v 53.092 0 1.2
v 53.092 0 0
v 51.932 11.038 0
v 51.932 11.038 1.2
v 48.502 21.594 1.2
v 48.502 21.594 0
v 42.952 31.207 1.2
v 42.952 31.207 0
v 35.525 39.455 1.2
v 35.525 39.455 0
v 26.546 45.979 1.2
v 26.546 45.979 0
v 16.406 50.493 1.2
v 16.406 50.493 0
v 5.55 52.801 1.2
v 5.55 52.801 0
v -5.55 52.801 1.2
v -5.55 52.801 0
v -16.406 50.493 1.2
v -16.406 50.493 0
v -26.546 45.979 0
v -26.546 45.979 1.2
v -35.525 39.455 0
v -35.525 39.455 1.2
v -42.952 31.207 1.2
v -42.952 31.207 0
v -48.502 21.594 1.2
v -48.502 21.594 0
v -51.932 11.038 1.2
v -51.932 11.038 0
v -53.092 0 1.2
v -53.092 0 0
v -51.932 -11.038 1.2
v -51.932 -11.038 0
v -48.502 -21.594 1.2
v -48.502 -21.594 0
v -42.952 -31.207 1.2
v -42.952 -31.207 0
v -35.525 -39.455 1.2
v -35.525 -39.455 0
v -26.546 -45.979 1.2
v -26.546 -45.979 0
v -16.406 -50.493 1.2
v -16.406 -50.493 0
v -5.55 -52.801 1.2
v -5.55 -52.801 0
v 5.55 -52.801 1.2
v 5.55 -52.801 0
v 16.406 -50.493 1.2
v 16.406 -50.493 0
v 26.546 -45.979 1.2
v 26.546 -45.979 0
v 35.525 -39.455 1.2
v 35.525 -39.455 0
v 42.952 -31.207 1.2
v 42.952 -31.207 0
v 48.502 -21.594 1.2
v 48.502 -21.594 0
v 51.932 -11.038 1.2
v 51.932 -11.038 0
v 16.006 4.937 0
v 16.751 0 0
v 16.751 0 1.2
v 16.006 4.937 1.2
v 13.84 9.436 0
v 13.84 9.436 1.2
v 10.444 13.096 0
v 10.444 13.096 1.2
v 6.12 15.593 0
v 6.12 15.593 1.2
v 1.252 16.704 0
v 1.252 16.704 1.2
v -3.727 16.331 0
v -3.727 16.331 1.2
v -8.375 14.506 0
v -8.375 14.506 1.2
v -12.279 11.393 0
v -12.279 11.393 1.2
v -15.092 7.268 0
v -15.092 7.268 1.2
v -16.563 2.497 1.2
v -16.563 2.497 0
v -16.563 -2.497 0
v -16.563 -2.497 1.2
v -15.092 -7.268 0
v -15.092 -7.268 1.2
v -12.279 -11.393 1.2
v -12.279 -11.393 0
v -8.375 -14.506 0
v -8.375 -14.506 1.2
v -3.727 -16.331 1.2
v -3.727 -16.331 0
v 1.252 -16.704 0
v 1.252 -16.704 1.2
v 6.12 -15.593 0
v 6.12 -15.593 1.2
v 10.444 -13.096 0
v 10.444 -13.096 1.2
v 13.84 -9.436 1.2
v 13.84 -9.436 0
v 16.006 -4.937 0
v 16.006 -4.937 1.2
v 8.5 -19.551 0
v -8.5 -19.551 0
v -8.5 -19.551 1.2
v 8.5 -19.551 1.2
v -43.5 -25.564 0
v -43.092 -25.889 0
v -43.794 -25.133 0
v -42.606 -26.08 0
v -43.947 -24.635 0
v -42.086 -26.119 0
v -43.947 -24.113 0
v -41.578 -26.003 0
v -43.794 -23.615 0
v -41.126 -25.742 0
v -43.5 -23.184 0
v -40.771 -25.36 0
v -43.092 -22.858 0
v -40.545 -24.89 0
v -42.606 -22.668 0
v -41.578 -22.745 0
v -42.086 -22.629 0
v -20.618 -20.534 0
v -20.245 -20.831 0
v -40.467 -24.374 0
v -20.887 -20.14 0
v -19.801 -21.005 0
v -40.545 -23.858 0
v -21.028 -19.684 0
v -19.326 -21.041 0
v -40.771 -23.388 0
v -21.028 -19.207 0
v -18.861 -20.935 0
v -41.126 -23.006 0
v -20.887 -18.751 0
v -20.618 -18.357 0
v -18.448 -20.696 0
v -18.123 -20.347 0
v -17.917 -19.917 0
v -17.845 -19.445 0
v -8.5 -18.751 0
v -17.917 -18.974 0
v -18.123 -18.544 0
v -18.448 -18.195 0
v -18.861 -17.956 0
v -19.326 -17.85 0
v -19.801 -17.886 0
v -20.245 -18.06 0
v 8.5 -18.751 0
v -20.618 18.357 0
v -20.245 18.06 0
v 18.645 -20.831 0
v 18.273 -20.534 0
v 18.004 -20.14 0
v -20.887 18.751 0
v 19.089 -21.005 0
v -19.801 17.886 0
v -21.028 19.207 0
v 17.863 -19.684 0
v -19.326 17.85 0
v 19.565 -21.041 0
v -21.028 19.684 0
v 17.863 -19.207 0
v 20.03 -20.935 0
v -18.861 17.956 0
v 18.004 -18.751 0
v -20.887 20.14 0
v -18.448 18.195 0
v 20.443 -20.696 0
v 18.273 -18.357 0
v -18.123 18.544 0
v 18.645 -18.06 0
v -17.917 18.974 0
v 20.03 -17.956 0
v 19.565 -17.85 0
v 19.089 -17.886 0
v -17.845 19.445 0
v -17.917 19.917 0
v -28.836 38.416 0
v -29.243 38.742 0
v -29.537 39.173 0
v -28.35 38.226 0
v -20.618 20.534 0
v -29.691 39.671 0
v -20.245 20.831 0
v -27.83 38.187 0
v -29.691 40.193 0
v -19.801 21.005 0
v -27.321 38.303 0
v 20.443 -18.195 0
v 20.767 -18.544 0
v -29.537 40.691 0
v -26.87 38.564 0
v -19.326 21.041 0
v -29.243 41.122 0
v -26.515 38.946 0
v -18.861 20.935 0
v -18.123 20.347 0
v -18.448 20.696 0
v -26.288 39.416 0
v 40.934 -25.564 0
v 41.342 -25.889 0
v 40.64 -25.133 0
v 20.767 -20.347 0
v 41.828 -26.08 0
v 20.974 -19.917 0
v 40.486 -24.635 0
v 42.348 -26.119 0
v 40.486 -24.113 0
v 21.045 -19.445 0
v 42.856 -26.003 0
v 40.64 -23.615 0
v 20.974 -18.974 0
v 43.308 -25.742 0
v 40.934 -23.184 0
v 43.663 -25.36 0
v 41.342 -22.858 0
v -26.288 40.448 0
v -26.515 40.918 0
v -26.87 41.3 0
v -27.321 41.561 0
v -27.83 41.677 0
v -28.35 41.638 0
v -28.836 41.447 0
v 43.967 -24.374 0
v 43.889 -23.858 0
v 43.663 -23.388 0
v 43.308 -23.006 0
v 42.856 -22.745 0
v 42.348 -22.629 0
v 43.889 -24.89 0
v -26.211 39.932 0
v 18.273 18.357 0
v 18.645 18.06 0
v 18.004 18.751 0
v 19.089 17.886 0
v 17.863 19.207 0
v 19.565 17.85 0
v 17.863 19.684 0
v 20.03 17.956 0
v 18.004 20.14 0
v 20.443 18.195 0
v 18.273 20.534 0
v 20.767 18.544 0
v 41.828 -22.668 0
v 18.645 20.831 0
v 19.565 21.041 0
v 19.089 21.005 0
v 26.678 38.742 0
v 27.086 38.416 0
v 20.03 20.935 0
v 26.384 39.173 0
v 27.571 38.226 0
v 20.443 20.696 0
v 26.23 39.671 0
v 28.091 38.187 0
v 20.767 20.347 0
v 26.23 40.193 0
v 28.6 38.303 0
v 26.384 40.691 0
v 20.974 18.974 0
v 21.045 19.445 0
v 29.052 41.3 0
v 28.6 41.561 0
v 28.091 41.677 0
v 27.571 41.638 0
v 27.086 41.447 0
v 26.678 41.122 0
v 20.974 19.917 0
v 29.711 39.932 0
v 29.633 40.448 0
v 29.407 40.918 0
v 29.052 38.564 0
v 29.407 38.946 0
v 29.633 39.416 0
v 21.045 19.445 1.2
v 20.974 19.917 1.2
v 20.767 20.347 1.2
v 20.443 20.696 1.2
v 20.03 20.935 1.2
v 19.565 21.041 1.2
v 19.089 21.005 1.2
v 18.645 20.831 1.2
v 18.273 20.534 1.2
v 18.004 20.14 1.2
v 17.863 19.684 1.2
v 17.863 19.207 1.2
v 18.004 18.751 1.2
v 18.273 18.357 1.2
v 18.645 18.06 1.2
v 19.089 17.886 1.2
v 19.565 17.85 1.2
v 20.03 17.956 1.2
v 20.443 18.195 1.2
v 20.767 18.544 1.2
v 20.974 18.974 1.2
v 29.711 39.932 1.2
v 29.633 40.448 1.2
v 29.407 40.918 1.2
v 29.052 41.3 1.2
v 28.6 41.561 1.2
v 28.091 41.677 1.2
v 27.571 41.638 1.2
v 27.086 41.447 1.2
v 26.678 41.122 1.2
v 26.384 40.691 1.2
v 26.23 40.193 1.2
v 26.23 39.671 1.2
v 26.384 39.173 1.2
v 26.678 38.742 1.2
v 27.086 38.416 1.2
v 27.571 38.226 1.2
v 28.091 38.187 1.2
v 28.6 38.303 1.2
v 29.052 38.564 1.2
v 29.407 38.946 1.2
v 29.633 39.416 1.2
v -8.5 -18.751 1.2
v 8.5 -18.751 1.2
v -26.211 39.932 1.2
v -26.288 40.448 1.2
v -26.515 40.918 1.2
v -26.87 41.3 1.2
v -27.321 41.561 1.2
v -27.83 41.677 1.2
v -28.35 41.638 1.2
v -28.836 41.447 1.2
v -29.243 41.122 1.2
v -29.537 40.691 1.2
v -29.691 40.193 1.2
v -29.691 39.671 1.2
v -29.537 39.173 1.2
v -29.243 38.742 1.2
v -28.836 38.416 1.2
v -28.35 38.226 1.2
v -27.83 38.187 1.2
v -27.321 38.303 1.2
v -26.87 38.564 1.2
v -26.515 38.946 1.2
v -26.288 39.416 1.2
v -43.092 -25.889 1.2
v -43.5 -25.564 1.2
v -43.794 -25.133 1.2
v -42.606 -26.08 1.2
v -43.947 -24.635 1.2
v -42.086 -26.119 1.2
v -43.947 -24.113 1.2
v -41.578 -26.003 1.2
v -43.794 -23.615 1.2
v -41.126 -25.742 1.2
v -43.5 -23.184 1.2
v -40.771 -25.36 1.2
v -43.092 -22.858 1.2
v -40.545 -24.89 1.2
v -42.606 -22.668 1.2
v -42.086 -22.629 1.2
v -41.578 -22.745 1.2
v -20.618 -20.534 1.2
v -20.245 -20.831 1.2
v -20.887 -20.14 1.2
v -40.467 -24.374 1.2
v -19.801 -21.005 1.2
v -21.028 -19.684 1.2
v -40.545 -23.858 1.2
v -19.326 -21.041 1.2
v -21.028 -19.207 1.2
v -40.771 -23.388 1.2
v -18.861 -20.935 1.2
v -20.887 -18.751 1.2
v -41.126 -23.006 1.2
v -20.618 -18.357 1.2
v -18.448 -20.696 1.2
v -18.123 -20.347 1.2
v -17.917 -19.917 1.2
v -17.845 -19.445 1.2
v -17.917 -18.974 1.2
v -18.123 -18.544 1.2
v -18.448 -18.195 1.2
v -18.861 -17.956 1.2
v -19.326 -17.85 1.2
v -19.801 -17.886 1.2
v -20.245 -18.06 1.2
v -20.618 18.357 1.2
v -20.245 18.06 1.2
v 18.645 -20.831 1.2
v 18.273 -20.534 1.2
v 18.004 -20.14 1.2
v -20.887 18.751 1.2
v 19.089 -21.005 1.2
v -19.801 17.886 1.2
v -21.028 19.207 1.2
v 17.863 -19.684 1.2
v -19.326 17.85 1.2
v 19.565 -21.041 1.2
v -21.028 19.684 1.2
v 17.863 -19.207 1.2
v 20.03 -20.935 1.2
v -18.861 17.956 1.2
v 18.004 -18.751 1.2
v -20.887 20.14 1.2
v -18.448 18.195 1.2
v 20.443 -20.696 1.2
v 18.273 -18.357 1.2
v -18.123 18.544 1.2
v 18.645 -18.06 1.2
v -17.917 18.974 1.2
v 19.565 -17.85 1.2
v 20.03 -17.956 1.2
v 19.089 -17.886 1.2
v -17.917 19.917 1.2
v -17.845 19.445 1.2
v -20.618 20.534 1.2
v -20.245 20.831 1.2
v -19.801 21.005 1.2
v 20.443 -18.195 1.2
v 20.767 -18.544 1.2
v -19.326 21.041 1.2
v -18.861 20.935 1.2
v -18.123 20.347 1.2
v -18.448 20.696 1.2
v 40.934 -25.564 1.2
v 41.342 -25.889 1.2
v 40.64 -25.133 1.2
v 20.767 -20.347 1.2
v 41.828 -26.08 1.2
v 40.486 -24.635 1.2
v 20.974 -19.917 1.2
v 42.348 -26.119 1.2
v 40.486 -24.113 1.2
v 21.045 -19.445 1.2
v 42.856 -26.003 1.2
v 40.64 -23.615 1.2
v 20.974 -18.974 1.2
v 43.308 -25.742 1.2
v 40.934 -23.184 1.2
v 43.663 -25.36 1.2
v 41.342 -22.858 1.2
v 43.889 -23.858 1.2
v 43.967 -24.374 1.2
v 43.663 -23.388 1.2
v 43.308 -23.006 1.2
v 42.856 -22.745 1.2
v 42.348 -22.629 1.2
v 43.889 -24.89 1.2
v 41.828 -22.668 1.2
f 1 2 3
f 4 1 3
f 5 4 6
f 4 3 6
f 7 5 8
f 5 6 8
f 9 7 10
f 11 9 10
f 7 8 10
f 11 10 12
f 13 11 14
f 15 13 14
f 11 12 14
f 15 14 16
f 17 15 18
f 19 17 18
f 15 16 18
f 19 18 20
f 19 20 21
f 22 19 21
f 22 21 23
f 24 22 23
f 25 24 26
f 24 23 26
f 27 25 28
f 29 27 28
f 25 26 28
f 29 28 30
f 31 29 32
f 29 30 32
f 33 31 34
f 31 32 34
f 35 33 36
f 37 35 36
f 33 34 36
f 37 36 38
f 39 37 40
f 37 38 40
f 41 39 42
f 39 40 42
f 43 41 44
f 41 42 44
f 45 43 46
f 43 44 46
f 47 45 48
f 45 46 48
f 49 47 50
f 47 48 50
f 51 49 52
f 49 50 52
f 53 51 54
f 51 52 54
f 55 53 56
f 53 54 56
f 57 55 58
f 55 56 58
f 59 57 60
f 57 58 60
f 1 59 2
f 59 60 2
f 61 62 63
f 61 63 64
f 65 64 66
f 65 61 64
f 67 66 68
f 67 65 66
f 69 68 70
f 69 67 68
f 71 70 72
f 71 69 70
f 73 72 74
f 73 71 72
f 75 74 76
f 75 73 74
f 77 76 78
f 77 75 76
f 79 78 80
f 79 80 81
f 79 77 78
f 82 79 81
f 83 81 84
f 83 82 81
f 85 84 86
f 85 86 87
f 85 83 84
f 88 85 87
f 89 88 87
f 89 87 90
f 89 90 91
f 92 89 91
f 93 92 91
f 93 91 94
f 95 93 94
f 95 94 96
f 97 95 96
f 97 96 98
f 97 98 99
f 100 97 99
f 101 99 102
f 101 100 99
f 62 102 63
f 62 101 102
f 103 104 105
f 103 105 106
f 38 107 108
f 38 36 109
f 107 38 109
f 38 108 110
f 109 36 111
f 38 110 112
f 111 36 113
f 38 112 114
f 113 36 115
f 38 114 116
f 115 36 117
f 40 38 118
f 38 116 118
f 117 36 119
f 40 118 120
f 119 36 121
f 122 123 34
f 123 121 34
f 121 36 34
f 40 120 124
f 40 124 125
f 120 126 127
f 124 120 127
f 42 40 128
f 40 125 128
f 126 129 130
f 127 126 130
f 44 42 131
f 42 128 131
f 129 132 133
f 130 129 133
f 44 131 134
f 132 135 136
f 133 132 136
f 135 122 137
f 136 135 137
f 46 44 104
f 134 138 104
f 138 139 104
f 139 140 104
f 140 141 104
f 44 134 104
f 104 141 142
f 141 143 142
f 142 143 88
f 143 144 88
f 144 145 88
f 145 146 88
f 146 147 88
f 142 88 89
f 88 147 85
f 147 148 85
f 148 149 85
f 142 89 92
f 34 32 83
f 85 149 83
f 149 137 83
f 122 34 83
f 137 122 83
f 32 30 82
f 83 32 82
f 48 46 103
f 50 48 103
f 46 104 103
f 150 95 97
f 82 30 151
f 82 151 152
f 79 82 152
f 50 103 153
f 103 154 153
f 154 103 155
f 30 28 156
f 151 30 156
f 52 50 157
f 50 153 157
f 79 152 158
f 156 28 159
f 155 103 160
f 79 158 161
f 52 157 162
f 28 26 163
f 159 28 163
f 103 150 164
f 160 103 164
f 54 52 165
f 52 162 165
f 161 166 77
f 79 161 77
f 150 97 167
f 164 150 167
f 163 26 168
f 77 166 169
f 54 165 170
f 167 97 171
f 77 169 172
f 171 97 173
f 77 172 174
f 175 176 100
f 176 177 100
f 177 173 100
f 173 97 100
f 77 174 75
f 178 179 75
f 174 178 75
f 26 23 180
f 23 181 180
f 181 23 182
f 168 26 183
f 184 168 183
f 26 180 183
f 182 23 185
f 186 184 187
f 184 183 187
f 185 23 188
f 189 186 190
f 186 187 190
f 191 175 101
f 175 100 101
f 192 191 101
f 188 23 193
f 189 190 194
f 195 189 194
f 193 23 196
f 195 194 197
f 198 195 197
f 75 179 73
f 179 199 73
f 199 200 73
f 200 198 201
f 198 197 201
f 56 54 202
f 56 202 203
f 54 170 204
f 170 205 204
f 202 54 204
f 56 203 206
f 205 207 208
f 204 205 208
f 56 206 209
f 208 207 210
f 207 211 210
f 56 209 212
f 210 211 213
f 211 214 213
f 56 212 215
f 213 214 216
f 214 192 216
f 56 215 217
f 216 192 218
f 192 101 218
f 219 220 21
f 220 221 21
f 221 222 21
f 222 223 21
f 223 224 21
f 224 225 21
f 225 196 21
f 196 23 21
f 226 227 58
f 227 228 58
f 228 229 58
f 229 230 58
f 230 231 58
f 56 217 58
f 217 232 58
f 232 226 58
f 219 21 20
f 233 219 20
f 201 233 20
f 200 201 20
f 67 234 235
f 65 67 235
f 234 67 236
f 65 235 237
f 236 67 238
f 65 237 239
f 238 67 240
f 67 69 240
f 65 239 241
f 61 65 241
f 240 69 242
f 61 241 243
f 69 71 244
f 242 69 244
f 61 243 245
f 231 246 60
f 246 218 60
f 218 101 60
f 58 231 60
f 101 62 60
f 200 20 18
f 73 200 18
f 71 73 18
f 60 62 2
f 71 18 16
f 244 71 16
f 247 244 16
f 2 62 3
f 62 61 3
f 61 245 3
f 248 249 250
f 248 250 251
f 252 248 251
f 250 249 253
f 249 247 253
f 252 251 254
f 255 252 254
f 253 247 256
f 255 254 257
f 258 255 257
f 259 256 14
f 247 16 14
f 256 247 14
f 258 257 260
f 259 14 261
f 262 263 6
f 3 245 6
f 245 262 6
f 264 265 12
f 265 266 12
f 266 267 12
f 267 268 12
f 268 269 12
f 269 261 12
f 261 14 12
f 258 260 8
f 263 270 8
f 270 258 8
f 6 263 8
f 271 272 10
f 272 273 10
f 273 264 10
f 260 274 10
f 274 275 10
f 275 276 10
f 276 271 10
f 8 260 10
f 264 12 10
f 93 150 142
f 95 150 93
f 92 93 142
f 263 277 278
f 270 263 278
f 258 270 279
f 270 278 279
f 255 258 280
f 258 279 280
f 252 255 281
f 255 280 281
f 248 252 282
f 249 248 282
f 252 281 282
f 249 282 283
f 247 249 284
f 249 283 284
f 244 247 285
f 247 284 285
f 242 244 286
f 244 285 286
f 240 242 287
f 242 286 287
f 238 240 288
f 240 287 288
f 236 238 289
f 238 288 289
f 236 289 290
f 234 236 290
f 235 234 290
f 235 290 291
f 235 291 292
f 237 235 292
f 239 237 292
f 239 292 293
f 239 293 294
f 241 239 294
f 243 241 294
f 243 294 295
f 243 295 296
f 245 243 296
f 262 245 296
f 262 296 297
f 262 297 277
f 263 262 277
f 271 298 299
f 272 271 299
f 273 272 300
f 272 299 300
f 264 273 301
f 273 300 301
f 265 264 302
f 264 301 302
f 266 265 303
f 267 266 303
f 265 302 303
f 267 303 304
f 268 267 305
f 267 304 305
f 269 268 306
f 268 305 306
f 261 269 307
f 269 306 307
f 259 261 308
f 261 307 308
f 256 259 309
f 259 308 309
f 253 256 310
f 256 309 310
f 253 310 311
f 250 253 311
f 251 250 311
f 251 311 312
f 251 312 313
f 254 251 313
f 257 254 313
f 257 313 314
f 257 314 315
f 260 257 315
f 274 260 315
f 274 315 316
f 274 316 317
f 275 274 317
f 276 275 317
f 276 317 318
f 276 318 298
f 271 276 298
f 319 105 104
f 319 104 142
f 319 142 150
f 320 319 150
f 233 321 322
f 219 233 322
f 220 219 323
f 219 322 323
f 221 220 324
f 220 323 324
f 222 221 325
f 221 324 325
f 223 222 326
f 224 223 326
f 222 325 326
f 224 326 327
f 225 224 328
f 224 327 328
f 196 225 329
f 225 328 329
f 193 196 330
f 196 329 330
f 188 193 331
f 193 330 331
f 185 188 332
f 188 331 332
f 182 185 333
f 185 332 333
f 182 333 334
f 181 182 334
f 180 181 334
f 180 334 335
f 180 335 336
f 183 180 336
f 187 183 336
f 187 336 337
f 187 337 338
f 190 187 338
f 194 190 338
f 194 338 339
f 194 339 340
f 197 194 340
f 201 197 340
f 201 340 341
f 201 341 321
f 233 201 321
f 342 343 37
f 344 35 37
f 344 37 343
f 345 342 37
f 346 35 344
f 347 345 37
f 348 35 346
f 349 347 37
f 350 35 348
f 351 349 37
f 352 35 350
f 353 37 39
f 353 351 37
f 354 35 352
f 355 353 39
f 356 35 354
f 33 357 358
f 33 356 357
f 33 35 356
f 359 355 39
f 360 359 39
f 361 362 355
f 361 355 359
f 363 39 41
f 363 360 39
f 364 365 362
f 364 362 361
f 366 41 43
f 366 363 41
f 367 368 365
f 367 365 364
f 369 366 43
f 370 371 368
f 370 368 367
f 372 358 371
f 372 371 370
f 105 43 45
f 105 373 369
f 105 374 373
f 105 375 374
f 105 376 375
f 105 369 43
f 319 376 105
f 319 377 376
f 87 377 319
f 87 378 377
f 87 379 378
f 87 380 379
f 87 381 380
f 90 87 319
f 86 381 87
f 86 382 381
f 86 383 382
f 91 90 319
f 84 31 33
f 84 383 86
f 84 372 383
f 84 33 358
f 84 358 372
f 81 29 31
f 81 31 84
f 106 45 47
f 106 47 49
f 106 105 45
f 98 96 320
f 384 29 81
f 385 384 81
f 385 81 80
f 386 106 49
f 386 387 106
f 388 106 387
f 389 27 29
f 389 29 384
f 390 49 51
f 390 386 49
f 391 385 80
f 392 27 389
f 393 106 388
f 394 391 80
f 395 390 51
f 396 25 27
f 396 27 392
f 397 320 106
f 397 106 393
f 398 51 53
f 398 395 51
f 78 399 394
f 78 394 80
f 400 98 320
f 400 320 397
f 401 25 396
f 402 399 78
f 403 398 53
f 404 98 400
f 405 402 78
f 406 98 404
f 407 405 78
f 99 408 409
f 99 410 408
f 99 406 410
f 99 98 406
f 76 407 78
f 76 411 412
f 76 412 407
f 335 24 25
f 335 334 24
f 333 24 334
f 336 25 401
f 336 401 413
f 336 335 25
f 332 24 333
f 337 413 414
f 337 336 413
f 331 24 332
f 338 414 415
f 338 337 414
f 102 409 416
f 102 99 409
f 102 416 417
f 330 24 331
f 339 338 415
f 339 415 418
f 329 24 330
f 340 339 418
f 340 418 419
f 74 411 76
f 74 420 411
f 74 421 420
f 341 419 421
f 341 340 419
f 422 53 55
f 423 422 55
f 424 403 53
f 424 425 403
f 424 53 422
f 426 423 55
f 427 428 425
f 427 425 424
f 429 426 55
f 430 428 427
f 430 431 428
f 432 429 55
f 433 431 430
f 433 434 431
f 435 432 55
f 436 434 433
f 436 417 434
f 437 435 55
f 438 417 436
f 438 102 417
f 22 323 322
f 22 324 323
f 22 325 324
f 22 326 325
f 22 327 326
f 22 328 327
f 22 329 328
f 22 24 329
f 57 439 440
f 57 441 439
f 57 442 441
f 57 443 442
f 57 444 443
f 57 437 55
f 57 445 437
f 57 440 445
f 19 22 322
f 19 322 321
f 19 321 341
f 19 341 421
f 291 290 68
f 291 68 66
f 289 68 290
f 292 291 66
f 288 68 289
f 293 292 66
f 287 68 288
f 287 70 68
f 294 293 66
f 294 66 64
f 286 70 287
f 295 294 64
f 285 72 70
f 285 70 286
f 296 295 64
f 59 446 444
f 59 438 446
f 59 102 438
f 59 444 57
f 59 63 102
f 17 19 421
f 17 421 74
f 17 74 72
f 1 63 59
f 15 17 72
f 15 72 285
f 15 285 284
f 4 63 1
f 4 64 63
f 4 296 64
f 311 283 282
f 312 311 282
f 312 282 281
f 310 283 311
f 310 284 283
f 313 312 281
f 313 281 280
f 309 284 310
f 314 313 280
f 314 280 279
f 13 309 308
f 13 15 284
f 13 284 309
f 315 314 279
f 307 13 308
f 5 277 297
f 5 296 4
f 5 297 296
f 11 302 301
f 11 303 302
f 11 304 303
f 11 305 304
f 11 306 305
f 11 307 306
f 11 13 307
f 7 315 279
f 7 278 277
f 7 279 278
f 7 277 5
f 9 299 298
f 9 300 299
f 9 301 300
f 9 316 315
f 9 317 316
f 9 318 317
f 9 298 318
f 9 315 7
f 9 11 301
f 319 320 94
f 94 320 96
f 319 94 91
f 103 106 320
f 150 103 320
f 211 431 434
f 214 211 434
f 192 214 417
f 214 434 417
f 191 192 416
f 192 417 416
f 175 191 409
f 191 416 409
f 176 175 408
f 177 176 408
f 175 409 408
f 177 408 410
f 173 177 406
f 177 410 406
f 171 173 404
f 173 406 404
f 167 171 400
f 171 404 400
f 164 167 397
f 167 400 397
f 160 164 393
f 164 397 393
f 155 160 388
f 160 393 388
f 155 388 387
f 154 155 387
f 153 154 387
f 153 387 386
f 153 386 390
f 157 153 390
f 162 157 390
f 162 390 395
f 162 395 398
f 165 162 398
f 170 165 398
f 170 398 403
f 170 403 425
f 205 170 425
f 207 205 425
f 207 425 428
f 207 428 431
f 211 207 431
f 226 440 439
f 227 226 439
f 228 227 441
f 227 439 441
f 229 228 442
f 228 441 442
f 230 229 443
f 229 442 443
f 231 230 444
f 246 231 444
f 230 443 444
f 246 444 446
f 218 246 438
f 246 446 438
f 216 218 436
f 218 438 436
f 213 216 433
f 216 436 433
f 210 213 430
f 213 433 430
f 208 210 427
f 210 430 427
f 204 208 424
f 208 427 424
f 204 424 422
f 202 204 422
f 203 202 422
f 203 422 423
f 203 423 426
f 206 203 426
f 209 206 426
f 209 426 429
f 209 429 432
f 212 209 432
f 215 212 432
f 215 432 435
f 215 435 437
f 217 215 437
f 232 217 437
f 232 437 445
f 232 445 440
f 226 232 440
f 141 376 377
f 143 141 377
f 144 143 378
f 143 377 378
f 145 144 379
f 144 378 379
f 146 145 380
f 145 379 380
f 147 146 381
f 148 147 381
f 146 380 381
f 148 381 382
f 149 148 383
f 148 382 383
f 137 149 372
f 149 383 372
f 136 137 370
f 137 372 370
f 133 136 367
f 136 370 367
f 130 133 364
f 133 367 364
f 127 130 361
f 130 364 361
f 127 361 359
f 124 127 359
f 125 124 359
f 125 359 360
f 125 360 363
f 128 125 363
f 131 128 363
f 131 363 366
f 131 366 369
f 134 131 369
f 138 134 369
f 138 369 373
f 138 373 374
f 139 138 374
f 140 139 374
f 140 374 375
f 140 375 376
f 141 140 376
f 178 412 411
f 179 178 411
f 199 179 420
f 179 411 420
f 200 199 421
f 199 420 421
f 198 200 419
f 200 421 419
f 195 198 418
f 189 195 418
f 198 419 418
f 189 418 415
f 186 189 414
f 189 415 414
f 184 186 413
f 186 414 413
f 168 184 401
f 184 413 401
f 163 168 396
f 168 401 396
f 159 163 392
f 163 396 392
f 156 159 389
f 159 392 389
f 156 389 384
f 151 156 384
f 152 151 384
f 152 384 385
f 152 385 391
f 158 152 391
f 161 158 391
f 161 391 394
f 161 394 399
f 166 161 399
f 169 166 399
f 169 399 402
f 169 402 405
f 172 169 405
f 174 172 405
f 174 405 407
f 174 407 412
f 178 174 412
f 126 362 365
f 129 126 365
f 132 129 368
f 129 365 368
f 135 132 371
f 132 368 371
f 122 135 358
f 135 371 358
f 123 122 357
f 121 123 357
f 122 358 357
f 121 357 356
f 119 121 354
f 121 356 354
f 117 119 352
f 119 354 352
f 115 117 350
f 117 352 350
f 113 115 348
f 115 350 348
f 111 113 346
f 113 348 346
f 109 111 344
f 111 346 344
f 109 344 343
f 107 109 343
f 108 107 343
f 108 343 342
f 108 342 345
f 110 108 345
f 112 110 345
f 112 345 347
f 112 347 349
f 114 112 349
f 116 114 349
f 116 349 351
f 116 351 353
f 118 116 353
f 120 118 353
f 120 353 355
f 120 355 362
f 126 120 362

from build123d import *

# Parameters (mm, degrees)
SKETCH3_R              = 53.091965393
SKETCH3_R_2            = 16.75054858
PCB_DEPTH              = 1.2
MAST_REACH             = 77.093
SKETCH5_R              = 1.6
ENCLOSURE_SCREWS_REACH = 77.093
SKETCH6_R              = 1.75
FLEX_CABLE_REACH       = 77.093
SKETCH9_W              = 17
SKETCH9_H              = 0.8


with BuildPart() as part:
    # Sketch3 → PCB (new body)
    with BuildSketch(Plane.XY):
        Circle(SKETCH3_R)
        Circle(SKETCH3_R_2, mode=Mode.SUBTRACT)
    extrude(amount=PCB_DEPTH)

    # Sketch5 → Mast (cut, up to next)
    with BuildSketch(Plane.XY.offset(1.2), mode=Mode.PRIVATE) as mast_sk1:
        with Locations((-19.445436483, -19.445436483)):
            Circle(SKETCH5_R)
    mast_tool1 = extrude(mast_sk1.sketch, amount=-MAST_REACH, mode=Mode.PRIVATE) & part.part
    # Sketch5 → Mast (cut, up to next)
    with BuildSketch(Plane.XY.offset(1.2), mode=Mode.PRIVATE) as mast_sk2:
        with Locations((-19.445436483, 19.445436483)):
            Circle(SKETCH5_R)
    mast_tool2 = extrude(mast_sk2.sketch, amount=-MAST_REACH, mode=Mode.PRIVATE) & part.part
    # Sketch5 → Mast (cut, up to next)
    with BuildSketch(Plane.XY.offset(1.2), mode=Mode.PRIVATE) as mast_sk3:
        with Locations((19.445436483, 19.445436483)):
            Circle(SKETCH5_R)
    mast_tool3 = extrude(mast_sk3.sketch, amount=-MAST_REACH, mode=Mode.PRIVATE) & part.part
    # Sketch5 → Mast (cut, up to next)
    with BuildSketch(Plane.XY.offset(1.2), mode=Mode.PRIVATE) as mast_sk4:
        with Locations((19.445436483, -19.445436483)):
            Circle(SKETCH5_R)
    mast_tool4 = extrude(mast_sk4.sketch, amount=-MAST_REACH, mode=Mode.PRIVATE) & part.part
    add(mast_tool1.solids().sort_by_distance((-19.445436, -19.445436, 1.2))[0], mode=Mode.SUBTRACT)
    add(mast_tool2.solids().sort_by_distance((-19.445436, 19.445436, 1.2))[0], mode=Mode.SUBTRACT)
    add(mast_tool3.solids().sort_by_distance((19.445436, 19.445436, 1.2))[0], mode=Mode.SUBTRACT)
    add(mast_tool4.solids().sort_by_distance((19.445436, -19.445436, 1.2))[0], mode=Mode.SUBTRACT)

    # Sketch6 → Enclosure screws (cut, up to next)
    with BuildSketch(Plane.XY.offset(1.2), mode=Mode.PRIVATE) as enclosure_screws_sk1:
        with Locations((27.960647328, 39.931942749)):
            Circle(SKETCH6_R)
    enclosure_screws_tool1 = extrude(enclosure_screws_sk1.sketch, amount=-ENCLOSURE_SCREWS_REACH, mode=Mode.PRIVATE) & part.part
    # Sketch6 → Enclosure screws (cut, up to next)
    with BuildSketch(Plane.XY.offset(1.2), mode=Mode.PRIVATE) as enclosure_screws_sk2:
        with Locations((42.216920637, -24.373950494)):
            Circle(SKETCH6_R)
    enclosure_screws_tool2 = extrude(enclosure_screws_sk2.sketch, amount=-ENCLOSURE_SCREWS_REACH, mode=Mode.PRIVATE) & part.part
    # Sketch6 → Enclosure screws (cut, up to next)
    with BuildSketch(Plane.XY.offset(1.2), mode=Mode.PRIVATE) as enclosure_screws_sk3:
        with Locations((-42.216920637, -24.373950494)):
            Circle(SKETCH6_R)
    enclosure_screws_tool3 = extrude(enclosure_screws_sk3.sketch, amount=-ENCLOSURE_SCREWS_REACH, mode=Mode.PRIVATE) & part.part
    # Sketch6 → Enclosure screws (cut, up to next)
    with BuildSketch(Plane.XY.offset(1.2), mode=Mode.PRIVATE) as enclosure_screws_sk4:
        with Locations((-27.960647328, 39.931942749)):
            Circle(SKETCH6_R)
    enclosure_screws_tool4 = extrude(enclosure_screws_sk4.sketch, amount=-ENCLOSURE_SCREWS_REACH, mode=Mode.PRIVATE) & part.part
    add(enclosure_screws_tool1.solids().sort_by_distance((27.960647, 39.931943, 1.2))[0], mode=Mode.SUBTRACT)
    add(enclosure_screws_tool2.solids().sort_by_distance((42.216921, -24.37395, 1.2))[0], mode=Mode.SUBTRACT)
    add(enclosure_screws_tool3.solids().sort_by_distance((-42.216921, -24.37395, 1.2))[0], mode=Mode.SUBTRACT)
    add(enclosure_screws_tool4.solids().sort_by_distance((-27.960647, 39.931943, 1.2))[0], mode=Mode.SUBTRACT)

    # Sketch9 → Flex cable (cut, up to next)
    with BuildSketch(Plane.XY, mode=Mode.PRIVATE) as flex_cable_sk1:
        with Locations((0, -19.15054858)):
            Rectangle(SKETCH9_W, SKETCH9_H)
    flex_cable_tool1 = extrude(flex_cable_sk1.sketch, amount=FLEX_CABLE_REACH, mode=Mode.PRIVATE) & part.part
    add(flex_cable_tool1.solids().sort_by_distance((0, -19.150549, 0))[0], mode=Mode.SUBTRACT)


solid = part.part
